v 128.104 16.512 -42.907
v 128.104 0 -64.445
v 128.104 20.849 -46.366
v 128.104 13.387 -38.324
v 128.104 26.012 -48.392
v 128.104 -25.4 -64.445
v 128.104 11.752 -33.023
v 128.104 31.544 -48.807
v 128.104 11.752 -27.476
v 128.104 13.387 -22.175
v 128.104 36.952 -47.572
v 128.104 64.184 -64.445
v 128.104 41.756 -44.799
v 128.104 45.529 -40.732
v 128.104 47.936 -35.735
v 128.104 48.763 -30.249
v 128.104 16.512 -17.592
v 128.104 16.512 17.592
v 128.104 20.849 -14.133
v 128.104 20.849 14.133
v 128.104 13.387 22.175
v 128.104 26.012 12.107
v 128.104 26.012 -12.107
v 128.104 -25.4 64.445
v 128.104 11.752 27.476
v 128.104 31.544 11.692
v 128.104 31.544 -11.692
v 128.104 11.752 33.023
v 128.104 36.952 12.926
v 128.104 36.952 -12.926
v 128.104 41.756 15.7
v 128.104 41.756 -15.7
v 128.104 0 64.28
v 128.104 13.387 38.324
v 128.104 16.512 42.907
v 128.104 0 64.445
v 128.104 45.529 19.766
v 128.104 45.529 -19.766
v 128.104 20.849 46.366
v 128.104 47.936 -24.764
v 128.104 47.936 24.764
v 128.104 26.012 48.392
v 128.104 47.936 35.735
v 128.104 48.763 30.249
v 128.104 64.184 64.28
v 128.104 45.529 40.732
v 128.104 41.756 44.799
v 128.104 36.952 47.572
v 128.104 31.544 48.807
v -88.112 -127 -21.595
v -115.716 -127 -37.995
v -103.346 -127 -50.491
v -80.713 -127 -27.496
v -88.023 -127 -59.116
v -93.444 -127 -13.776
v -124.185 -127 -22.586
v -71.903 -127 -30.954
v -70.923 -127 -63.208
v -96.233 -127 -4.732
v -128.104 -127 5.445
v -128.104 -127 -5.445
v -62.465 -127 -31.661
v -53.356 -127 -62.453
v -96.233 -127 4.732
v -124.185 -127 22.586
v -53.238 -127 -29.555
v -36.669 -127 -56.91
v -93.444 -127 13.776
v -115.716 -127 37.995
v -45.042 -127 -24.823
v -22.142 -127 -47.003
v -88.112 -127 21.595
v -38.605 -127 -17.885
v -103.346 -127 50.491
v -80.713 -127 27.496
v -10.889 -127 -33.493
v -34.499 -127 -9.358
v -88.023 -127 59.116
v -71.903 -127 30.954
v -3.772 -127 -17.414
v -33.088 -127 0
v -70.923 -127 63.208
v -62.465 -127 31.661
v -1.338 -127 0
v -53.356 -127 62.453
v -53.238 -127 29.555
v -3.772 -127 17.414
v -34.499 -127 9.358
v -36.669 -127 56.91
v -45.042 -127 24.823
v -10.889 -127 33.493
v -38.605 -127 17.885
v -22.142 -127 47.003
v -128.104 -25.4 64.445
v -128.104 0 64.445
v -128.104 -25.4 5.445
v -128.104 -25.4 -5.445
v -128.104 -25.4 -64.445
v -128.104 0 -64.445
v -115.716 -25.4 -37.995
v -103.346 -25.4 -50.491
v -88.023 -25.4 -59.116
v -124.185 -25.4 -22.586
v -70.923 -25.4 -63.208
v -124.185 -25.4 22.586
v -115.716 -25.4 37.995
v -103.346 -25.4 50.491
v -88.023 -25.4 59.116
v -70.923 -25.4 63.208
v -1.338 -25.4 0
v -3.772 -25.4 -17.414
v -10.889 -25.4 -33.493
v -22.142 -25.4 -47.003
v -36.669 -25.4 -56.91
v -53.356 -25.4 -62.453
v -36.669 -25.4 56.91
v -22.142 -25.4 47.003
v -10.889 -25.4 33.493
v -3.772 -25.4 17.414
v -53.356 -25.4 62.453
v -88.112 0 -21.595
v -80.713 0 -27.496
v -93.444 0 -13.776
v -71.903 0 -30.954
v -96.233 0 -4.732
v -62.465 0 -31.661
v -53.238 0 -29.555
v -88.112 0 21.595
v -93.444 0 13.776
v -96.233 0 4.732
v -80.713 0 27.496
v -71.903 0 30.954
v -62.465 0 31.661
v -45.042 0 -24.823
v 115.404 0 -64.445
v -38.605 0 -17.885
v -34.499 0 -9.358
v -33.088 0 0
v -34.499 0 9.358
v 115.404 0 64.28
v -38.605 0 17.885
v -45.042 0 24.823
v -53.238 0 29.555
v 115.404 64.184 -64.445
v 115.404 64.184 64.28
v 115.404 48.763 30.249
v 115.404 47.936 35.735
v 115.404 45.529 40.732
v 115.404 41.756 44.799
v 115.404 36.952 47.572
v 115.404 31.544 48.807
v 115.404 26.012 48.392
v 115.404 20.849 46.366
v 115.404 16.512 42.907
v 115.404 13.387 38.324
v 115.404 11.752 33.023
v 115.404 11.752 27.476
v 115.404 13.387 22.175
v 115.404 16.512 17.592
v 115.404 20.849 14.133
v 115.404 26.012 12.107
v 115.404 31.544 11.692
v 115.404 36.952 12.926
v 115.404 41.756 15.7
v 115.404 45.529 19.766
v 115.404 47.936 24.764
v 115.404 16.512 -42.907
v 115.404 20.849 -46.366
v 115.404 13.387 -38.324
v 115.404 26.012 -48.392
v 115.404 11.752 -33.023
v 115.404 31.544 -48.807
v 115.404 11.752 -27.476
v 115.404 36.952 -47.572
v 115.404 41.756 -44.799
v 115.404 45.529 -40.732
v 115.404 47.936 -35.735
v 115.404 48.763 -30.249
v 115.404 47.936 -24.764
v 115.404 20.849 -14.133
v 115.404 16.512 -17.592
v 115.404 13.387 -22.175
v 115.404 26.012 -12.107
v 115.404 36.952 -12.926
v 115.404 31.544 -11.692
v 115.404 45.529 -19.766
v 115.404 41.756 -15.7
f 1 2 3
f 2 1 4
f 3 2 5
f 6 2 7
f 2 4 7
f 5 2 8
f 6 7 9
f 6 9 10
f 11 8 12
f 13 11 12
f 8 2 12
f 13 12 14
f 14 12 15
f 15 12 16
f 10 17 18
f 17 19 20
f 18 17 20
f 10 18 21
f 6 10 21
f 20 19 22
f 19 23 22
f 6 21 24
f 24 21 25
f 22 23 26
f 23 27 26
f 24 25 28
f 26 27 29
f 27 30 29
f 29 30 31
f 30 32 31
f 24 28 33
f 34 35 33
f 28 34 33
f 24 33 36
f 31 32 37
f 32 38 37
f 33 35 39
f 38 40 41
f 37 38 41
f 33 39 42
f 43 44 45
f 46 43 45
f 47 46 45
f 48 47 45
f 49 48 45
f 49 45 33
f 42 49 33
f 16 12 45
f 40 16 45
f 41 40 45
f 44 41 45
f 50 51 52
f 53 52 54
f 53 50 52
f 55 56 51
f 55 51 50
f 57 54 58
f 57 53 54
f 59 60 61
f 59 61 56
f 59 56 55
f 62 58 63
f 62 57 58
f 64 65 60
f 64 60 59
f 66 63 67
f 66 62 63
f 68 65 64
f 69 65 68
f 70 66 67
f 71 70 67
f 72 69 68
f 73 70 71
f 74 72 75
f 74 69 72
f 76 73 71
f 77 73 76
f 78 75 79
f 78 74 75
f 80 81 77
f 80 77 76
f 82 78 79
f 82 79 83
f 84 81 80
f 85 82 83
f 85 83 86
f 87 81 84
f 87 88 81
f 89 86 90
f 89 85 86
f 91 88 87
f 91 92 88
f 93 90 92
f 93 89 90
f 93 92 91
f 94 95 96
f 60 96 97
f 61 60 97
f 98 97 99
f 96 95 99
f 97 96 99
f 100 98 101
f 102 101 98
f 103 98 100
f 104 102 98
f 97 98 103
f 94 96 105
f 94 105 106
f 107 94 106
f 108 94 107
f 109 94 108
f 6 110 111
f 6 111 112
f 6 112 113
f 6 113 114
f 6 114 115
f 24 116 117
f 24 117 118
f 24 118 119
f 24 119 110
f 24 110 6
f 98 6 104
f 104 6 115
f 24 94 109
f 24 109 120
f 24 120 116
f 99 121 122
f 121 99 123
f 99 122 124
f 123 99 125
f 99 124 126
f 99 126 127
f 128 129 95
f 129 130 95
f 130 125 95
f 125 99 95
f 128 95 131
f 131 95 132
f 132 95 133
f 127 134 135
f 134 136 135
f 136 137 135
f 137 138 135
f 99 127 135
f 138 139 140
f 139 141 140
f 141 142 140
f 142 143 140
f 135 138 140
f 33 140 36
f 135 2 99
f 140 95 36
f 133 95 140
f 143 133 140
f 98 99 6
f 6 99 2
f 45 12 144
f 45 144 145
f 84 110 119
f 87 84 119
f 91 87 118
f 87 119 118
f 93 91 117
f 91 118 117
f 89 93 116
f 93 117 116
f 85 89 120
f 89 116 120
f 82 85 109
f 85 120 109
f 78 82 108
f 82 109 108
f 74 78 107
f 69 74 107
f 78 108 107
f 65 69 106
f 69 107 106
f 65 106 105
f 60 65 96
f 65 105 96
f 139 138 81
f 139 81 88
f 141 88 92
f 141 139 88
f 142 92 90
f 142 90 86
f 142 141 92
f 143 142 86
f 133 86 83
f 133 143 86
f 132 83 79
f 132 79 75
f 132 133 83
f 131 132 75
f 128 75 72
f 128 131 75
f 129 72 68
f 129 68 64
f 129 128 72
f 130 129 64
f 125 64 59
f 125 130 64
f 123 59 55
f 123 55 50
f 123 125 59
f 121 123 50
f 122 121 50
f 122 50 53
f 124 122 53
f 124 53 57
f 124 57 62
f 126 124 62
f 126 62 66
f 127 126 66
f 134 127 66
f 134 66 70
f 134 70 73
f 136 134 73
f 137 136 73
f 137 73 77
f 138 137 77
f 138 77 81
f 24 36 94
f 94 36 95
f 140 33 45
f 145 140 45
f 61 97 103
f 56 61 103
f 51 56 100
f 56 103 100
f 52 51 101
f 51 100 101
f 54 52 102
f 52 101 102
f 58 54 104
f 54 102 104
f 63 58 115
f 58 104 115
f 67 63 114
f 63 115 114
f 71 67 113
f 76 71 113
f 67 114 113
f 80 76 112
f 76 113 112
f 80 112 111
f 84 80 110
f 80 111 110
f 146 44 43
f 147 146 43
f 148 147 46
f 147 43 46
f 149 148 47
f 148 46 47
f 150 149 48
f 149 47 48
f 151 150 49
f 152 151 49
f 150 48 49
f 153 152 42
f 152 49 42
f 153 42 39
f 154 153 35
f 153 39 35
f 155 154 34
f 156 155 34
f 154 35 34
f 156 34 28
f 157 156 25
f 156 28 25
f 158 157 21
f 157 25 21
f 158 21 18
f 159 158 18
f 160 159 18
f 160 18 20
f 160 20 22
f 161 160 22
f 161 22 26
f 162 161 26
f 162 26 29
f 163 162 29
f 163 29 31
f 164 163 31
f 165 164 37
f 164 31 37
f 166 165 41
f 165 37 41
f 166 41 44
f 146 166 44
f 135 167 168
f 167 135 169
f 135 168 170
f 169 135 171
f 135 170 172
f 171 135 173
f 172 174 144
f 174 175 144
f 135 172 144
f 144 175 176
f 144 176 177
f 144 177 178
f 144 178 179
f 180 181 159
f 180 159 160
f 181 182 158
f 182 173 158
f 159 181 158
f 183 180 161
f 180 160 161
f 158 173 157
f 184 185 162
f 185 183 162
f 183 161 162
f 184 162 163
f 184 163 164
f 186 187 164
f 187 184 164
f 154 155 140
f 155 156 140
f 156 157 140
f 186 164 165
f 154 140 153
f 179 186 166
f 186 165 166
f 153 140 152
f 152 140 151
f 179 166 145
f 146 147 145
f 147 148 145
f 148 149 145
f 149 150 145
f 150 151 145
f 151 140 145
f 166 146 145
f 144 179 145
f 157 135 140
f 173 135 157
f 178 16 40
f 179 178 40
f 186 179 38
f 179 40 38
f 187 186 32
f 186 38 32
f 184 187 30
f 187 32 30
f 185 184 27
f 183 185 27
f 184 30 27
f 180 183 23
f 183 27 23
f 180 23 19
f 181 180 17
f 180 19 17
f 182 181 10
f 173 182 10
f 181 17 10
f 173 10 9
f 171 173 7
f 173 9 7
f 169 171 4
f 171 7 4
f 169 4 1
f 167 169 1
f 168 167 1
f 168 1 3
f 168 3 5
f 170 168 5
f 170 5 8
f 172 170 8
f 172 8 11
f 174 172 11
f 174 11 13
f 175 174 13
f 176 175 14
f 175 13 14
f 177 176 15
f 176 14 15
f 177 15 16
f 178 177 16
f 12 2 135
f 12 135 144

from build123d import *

# Parameters (mm, degrees)
F0_R     = 31.75
F1_DEPTH = 25.4
F2_DEPTH = 127
F3_W     = 64.183906
F3_H     = 128.724985
F3_R     = 18.609461
F4_DEPTH = 12.7


with BuildPart() as f1:
    # F0 (on Front) → F1 (new body)
    with BuildSketch(Plane.XZ):
        with BuildLine():
            ThreePointArc((-1.337954, 0), (-62.112969, 63.441504), (-128.104079, 5.444951))
            Line((-128.104079, 5.444951), (-128.104079, -5.444951))
            ThreePointArc((-128.104079, -5.444951), (-62.112969, -63.441504), (-1.337954, 0))
        make_face()
        with Locations((-64.837954, 0)):
            Circle(F0_R, mode=Mode.SUBTRACT)
        with BuildLine():
            Line((128.104079, 64.444997), (-128.104079, 64.444997))
            Line((-128.104079, 64.444997), (-128.104079, 5.444951))
            ThreePointArc((-128.104079, 5.444951), (-62.112969, 63.441504), (-1.337954, 0))
            ThreePointArc((-1.337954, 0), (-62.112969, -63.441504), (-128.104079, -5.444951))
            Line((-128.104079, -5.444951), (-128.104079, -64.444997))
            Line((-128.104079, -64.444997), (128.104079, -64.444997))
            Line((128.104079, -64.444997), (128.104079, 64.444997))
        make_face()
    extrude(amount=F1_DEPTH)

    # F0 (on Front) → F2 (join)
    with BuildSketch(Plane.XZ):
        with BuildLine():
            ThreePointArc((-1.337954, 0), (-62.112969, 63.441504), (-128.104079, 5.444951))
            Line((-128.104079, 5.444951), (-128.104079, -5.444951))
            ThreePointArc((-128.104079, -5.444951), (-62.112969, -63.441504), (-1.337954, 0))
        make_face()
        with Locations((-64.837954, 0)):
            Circle(F0_R, mode=Mode.SUBTRACT)
    extrude(amount=F2_DEPTH)

    # F3 (on face) → F4 (join)
    with BuildSketch(Plane.YZ.offset(128.104079)):
        with Locations((32.091953, -0.082504)):
            Rectangle(F3_W, F3_H)
        with Locations((30.153323, -30.249406)):
            Circle(F3_R, mode=Mode.SUBTRACT)
        with Locations((30.153323, 30.249406)):
            Circle(F3_R, mode=Mode.SUBTRACT)
    extrude(amount=-F4_DEPTH)


solid = f1.part
